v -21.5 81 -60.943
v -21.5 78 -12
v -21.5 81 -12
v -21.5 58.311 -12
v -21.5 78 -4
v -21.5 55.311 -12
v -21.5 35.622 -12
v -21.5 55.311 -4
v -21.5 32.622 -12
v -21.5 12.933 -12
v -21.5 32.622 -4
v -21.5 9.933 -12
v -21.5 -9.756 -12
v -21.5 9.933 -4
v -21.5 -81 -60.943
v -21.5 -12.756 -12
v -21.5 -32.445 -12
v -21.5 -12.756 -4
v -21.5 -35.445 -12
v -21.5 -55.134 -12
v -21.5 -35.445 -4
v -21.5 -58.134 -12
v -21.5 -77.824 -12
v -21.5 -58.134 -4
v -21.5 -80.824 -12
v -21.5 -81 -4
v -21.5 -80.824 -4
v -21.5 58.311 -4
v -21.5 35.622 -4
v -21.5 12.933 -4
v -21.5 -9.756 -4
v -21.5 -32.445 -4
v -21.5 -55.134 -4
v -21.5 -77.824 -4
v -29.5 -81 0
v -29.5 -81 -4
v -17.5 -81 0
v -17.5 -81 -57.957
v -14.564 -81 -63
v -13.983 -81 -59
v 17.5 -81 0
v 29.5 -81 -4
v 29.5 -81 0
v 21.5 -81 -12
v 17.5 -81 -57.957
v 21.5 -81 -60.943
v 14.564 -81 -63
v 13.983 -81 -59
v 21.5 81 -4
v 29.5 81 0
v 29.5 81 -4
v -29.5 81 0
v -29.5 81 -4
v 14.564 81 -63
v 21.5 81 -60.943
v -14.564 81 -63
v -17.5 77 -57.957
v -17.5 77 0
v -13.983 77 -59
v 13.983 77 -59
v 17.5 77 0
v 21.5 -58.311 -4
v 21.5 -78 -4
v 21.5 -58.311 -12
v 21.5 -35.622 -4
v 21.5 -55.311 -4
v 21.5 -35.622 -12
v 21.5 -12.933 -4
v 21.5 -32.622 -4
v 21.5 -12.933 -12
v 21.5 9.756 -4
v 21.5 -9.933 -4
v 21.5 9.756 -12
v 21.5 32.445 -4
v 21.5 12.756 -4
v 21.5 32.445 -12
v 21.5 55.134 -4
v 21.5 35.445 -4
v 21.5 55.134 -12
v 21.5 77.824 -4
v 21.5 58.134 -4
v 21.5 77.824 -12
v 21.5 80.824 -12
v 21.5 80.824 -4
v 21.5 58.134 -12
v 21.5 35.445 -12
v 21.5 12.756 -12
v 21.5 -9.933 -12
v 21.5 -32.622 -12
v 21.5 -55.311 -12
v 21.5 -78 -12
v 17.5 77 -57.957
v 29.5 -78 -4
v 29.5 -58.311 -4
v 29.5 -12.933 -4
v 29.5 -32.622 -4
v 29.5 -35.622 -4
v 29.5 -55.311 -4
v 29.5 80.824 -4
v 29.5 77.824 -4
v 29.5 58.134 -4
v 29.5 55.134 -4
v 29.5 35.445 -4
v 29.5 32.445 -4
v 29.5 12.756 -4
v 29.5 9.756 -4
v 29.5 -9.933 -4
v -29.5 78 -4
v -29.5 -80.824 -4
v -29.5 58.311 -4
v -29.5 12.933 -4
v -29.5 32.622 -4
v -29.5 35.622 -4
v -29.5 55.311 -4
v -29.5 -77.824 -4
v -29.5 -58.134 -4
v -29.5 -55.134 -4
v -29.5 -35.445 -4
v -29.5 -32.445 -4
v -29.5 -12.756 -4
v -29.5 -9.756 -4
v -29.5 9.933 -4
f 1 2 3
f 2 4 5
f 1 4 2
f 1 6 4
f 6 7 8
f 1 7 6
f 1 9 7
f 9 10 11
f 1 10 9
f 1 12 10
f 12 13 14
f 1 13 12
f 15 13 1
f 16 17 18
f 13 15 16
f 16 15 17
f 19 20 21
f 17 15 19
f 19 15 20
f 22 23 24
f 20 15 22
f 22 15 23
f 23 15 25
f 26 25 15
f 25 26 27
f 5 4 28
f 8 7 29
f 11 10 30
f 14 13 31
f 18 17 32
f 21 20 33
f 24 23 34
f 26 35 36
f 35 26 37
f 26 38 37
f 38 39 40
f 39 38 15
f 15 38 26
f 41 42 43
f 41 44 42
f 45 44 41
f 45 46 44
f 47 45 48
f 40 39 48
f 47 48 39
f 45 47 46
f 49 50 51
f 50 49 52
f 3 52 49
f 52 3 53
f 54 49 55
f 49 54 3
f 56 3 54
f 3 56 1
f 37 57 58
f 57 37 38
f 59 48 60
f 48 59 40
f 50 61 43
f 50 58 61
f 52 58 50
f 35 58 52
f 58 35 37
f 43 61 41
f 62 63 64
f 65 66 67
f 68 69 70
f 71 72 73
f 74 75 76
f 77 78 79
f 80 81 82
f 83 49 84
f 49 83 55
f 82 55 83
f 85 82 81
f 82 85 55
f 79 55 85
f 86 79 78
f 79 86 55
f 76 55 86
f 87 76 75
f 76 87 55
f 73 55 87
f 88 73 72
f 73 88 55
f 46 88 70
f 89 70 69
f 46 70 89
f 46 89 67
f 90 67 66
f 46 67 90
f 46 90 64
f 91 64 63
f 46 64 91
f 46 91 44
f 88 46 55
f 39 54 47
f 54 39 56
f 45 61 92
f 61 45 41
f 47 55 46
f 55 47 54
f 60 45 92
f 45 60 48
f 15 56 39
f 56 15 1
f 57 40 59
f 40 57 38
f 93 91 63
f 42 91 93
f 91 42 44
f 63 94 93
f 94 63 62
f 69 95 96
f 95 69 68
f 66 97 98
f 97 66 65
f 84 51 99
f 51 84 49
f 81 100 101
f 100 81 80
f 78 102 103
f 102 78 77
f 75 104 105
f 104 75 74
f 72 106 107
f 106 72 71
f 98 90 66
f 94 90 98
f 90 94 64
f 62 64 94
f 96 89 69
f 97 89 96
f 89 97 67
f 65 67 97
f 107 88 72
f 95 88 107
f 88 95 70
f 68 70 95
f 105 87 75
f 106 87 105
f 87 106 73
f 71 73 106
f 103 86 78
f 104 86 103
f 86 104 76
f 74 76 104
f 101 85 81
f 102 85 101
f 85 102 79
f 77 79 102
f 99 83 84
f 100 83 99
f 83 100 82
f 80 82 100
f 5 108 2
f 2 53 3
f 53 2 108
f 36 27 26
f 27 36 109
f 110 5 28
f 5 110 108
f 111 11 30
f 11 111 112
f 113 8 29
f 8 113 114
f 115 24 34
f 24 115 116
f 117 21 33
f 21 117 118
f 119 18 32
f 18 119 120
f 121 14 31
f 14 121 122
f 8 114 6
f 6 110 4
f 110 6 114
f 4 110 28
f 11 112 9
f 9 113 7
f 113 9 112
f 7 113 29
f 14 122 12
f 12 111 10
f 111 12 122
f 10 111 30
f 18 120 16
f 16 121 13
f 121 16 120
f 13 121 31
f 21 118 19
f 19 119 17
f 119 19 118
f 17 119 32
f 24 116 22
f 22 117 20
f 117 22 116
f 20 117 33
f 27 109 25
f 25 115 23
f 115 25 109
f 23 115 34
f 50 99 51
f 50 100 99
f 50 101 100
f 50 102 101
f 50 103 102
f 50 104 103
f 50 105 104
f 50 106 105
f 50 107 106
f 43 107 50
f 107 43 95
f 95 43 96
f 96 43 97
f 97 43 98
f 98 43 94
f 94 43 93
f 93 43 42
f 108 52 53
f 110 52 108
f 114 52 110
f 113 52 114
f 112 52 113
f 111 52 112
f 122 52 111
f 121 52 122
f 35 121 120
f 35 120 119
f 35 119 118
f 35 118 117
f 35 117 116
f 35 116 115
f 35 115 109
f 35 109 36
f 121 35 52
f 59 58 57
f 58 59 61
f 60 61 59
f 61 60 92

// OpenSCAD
// file: ../lib/JMO_library.scad
/* MAGNOLIO QUADCOPTER

FILE: JMO_library.scad

AUTHOR: Jose Manuel Ortiz

DESCRIPTION:
General purpose primitive modules

LICENSE:
Magnolio by Kinamics is licensed under a Creative Commons Attribution-ShareAlike 4.0 International License.
http://creativecommons.org/licenses/by-sa/4.0/
*/

//an open case with open base, wall width d and chamfer specified by d1
module case_base_open(l=160, h=32, w=55, d=4, d1=2){
	h1 = sqrt(w*w/4+h*h);
	h2 = h1-d1-d;
	x1 = w*h1/(2*h2);
	y1 = h*h1/h2;
	x2 = d1*w/(2*h1);
	alpha = atan(2*h/w);
	//echo("h1=",h1," h2=",h2," x1=",x1," y1=",y1," x2=",x2, " alpha=",alpha);
	
	rotate([90,0,0])
	translate([0,0,-l/2])
	difference(){
		union(){
			//main box
			translate([w/2,0,0]) cube([d,h,l]);
			translate([0,d/2+h,l/2]) cube([w+2*d,d,l],center=true);
			translate([-w/2-d,0,0]) cube([d,h,l]);
			
			//chamfers
			rotate([0,0,90-alpha])
				translate([0,h2+d/2+d,l/2])
					cube([2*x2+2*d,d,l],center=true);
			rotate([0,0,-90+alpha])
				translate([0,h2+d/2+d,l/2])
					cube([2*x2+2*d,d,l],center=true);
		}
		//remove excess
		rotate([0,0,90-alpha])
				translate([0,h2+3*d,l/2])
					cube([2*x2+2*d,2*d,l+1],center=true);
		rotate([0,0,-90+alpha])
				translate([0,h2+3*d,l/2])
					cube([2*x2+2*d,2*d,l+1],center=true);
		translate([w/2+d,0,-0.5]) cube([d,h+2*d,l+1]);
		translate([0,d+d/2+h,l/2]) cube([w+2*d,d,l+1],center=true);
		translate([-w/2-2*d,0,-0.5]) cube([d,h+3*d,l+1]);
	}
}
//case_base_open();

//Pyramid module: generalization of Openscad manual example
module pyramid_square_base(w=10, l=10, h=10){
	polyhedron(
		points=[ [w/2,l/2,0],[w/2,-l/2,0],[-w/2,-l/2,0],[-w/2,l/2,0], // the four points at base
           [0,0,h]  ],                                 // the apex point 
  faces=[ [0,1,4],[1,2,4],[2,3,4],[3,0,4],              // each triangle side
              [1,0,3],[2,1,3] ]);                         // two triangles for square base
}
//pyramid_square_base(w=150, l=150, h=60);
// main file
/*
Battery Holder Case
---------

Print settings (Sli3r v1.1.7, these are merely my sugestions, not necessarily the best ones):
- Black ABS, 3mm filament
- layer height: 0.3
- perimeters: 4
- Solid layers: 8 (top), 8 (bottom)
- Infill: 40% honeycomb
- Speed: 50mm/s (permeters), 80mm/s (infill)
- Support Material:
	- Overhang threshold: 45º
	- Pattern: pillars
- Brim: 4mm
- Temperature: 240ºC (extruder), 120ºC (bed)

Other info:
- 3mm glass bed with kapton tape
- nozzle diameter: 0.35mm
- bed size: 170 (x), 180 (y)
- G-Code flavor: RepRap Marlin

*/

include <../Magnolio_parts.scad>

battery_holder_case();
